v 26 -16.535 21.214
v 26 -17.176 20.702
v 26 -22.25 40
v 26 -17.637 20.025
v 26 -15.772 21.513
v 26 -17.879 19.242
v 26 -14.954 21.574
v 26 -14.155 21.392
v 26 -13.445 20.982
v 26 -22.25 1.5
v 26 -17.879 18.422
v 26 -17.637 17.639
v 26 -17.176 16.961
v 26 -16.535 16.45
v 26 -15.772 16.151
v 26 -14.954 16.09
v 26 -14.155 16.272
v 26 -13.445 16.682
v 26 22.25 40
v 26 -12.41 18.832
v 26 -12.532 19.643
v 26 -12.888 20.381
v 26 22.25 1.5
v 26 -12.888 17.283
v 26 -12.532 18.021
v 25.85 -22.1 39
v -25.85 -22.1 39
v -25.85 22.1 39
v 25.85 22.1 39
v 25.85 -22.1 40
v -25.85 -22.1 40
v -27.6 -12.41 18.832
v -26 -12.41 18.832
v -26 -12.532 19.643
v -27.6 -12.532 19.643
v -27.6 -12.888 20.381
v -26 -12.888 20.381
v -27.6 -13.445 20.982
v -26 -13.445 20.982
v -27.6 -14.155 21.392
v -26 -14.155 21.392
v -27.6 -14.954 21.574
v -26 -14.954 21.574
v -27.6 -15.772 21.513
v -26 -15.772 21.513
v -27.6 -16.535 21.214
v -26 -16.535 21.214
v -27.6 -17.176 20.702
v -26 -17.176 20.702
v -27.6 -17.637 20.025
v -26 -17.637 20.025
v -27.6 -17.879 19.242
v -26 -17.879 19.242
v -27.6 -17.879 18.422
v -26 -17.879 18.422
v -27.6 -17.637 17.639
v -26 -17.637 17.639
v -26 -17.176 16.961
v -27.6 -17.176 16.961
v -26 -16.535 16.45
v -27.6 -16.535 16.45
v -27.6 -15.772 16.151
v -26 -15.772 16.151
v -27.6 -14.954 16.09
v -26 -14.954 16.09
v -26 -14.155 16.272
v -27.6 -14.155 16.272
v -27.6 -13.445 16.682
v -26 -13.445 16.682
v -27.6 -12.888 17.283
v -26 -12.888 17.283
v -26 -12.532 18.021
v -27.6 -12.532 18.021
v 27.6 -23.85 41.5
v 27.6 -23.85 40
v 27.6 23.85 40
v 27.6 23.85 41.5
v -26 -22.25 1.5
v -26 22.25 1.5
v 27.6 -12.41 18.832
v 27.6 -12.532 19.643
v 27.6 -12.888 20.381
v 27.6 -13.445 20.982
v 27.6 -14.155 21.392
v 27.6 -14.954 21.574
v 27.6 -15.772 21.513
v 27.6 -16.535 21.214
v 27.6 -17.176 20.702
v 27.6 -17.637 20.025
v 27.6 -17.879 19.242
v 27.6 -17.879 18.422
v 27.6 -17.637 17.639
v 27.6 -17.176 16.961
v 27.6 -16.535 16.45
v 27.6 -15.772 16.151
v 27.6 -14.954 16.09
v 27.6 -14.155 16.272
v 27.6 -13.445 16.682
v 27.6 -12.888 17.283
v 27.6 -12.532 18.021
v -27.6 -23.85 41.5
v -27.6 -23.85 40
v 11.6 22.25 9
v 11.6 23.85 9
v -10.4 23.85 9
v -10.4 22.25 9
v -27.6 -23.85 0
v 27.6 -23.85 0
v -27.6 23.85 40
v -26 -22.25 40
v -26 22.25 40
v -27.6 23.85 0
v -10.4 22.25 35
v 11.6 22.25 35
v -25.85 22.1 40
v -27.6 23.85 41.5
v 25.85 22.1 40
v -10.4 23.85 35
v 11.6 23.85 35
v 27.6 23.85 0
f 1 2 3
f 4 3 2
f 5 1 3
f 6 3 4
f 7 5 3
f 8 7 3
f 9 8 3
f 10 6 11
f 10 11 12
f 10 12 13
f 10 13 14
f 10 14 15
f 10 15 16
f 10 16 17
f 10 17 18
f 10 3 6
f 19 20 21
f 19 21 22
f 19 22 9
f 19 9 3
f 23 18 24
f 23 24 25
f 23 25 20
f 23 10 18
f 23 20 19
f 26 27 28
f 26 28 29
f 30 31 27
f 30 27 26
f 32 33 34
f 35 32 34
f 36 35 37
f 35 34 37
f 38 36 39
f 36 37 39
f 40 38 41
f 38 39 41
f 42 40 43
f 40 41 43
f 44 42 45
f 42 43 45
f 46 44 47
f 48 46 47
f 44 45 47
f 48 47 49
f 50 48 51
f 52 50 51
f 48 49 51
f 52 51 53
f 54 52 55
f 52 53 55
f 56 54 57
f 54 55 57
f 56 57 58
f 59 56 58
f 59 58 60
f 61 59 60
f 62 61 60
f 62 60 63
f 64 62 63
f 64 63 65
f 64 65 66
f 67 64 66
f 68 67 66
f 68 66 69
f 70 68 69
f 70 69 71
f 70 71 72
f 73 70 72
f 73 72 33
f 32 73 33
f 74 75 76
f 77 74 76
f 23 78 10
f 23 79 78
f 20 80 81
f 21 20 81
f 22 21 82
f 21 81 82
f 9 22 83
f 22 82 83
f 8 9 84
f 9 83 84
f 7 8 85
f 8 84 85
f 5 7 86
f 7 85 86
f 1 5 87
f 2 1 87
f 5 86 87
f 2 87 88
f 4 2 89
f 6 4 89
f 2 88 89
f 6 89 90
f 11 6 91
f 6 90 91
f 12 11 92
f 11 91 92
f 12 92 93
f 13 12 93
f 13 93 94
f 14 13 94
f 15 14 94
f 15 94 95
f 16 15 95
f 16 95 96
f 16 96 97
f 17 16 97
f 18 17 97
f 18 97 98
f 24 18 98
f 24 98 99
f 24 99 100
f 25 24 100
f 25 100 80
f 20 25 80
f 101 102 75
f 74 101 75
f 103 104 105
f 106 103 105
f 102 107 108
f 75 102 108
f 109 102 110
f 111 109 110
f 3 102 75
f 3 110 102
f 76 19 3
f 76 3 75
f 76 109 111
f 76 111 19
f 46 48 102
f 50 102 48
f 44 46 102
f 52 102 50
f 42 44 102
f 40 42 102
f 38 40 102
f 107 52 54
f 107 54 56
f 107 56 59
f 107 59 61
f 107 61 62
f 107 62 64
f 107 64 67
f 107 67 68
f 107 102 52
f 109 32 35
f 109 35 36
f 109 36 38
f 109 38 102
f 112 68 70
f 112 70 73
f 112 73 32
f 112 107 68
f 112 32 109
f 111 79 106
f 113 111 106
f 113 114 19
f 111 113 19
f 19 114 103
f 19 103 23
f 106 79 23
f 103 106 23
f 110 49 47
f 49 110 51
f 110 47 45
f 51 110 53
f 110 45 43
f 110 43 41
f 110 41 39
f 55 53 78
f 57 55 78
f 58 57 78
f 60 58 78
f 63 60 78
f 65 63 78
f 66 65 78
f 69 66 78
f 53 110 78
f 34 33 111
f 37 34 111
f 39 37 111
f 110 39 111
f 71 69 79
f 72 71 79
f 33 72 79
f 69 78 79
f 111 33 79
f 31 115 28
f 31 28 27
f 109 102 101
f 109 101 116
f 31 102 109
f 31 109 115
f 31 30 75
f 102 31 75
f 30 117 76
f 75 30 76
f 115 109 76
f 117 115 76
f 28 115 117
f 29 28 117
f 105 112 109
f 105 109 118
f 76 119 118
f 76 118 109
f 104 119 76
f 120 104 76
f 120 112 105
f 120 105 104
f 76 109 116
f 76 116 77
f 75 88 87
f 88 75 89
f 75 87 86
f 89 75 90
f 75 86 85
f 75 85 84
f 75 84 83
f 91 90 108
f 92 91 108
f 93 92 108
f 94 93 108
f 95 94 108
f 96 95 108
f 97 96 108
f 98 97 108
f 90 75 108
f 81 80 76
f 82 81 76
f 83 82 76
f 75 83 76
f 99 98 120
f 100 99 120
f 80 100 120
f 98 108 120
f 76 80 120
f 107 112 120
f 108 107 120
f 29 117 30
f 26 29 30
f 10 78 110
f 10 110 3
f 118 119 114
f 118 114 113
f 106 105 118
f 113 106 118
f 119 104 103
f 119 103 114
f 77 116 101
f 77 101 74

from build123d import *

# Parameters (mm, degrees)
F0_W      = 55.2
F0_H      = 47.7
F0_W_2    = 52
F0_H_2    = 44.5
F1_DEPTH  = 1.5
F2_DEPTH  = 40
F3_W      = 22
F3_H      = 26
F4_DEPTH  = 1.6
F5_R      = 2.75
F6_DEPTH  = 55.201
F7_W      = 55.2
F7_H      = 47.7
F8_DEPTH  = 1.5
F9_W      = 51.7
F9_H      = 44.2
F10_DEPTH = 1


with BuildPart() as f1:
    # F0 (on Top) → F1 (new body)
    with BuildSketch(Plane.XY):
        Rectangle(F0_W, F0_H)
        Rectangle(F0_W_2, F0_H_2, mode=Mode.SUBTRACT)
        Rectangle(F0_W_2, F0_H_2)
    extrude(amount=F1_DEPTH)

    # F0 (on Top) → F2 (join)
    with BuildSketch(Plane.XY):
        Rectangle(F0_W, F0_H)
        Rectangle(F0_W_2, F0_H_2, mode=Mode.SUBTRACT)
    extrude(amount=F2_DEPTH)

    # F3 (on face) → F4 (cut, through all)
    with BuildSketch(Plane(origin=(0, 23.85, 0), x_dir=(-1, 0, 0), z_dir=(0, 1, 0))):
        with Locations((-0.6, 22)):
            Rectangle(F3_W, F3_H)
    extrude(amount=-F4_DEPTH, mode=Mode.SUBTRACT)

    # F5 (on face) → F6 (cut, through all)
    with BuildSketch(Plane.YZ.offset(27.6)):
        with Locations((-15.159763, 18.831952)):
            Circle(F5_R)
    extrude(amount=-F6_DEPTH, mode=Mode.SUBTRACT)


with BuildPart() as f8:
    # F7 (on face) → F8 (new body)
    with BuildSketch(Plane.XY.offset(40)):
        Rectangle(F7_W, F7_H)
    extrude(amount=F8_DEPTH)

    # F9 (on face) → F10 (join)
    with BuildSketch(Plane(origin=(0, 0, 40), x_dir=(1, 0, 0), z_dir=(0, 0, -1))):
        Rectangle(F9_W, F9_H)
    extrude(amount=F10_DEPTH)


solid = Compound([f1.part, f8.part])
